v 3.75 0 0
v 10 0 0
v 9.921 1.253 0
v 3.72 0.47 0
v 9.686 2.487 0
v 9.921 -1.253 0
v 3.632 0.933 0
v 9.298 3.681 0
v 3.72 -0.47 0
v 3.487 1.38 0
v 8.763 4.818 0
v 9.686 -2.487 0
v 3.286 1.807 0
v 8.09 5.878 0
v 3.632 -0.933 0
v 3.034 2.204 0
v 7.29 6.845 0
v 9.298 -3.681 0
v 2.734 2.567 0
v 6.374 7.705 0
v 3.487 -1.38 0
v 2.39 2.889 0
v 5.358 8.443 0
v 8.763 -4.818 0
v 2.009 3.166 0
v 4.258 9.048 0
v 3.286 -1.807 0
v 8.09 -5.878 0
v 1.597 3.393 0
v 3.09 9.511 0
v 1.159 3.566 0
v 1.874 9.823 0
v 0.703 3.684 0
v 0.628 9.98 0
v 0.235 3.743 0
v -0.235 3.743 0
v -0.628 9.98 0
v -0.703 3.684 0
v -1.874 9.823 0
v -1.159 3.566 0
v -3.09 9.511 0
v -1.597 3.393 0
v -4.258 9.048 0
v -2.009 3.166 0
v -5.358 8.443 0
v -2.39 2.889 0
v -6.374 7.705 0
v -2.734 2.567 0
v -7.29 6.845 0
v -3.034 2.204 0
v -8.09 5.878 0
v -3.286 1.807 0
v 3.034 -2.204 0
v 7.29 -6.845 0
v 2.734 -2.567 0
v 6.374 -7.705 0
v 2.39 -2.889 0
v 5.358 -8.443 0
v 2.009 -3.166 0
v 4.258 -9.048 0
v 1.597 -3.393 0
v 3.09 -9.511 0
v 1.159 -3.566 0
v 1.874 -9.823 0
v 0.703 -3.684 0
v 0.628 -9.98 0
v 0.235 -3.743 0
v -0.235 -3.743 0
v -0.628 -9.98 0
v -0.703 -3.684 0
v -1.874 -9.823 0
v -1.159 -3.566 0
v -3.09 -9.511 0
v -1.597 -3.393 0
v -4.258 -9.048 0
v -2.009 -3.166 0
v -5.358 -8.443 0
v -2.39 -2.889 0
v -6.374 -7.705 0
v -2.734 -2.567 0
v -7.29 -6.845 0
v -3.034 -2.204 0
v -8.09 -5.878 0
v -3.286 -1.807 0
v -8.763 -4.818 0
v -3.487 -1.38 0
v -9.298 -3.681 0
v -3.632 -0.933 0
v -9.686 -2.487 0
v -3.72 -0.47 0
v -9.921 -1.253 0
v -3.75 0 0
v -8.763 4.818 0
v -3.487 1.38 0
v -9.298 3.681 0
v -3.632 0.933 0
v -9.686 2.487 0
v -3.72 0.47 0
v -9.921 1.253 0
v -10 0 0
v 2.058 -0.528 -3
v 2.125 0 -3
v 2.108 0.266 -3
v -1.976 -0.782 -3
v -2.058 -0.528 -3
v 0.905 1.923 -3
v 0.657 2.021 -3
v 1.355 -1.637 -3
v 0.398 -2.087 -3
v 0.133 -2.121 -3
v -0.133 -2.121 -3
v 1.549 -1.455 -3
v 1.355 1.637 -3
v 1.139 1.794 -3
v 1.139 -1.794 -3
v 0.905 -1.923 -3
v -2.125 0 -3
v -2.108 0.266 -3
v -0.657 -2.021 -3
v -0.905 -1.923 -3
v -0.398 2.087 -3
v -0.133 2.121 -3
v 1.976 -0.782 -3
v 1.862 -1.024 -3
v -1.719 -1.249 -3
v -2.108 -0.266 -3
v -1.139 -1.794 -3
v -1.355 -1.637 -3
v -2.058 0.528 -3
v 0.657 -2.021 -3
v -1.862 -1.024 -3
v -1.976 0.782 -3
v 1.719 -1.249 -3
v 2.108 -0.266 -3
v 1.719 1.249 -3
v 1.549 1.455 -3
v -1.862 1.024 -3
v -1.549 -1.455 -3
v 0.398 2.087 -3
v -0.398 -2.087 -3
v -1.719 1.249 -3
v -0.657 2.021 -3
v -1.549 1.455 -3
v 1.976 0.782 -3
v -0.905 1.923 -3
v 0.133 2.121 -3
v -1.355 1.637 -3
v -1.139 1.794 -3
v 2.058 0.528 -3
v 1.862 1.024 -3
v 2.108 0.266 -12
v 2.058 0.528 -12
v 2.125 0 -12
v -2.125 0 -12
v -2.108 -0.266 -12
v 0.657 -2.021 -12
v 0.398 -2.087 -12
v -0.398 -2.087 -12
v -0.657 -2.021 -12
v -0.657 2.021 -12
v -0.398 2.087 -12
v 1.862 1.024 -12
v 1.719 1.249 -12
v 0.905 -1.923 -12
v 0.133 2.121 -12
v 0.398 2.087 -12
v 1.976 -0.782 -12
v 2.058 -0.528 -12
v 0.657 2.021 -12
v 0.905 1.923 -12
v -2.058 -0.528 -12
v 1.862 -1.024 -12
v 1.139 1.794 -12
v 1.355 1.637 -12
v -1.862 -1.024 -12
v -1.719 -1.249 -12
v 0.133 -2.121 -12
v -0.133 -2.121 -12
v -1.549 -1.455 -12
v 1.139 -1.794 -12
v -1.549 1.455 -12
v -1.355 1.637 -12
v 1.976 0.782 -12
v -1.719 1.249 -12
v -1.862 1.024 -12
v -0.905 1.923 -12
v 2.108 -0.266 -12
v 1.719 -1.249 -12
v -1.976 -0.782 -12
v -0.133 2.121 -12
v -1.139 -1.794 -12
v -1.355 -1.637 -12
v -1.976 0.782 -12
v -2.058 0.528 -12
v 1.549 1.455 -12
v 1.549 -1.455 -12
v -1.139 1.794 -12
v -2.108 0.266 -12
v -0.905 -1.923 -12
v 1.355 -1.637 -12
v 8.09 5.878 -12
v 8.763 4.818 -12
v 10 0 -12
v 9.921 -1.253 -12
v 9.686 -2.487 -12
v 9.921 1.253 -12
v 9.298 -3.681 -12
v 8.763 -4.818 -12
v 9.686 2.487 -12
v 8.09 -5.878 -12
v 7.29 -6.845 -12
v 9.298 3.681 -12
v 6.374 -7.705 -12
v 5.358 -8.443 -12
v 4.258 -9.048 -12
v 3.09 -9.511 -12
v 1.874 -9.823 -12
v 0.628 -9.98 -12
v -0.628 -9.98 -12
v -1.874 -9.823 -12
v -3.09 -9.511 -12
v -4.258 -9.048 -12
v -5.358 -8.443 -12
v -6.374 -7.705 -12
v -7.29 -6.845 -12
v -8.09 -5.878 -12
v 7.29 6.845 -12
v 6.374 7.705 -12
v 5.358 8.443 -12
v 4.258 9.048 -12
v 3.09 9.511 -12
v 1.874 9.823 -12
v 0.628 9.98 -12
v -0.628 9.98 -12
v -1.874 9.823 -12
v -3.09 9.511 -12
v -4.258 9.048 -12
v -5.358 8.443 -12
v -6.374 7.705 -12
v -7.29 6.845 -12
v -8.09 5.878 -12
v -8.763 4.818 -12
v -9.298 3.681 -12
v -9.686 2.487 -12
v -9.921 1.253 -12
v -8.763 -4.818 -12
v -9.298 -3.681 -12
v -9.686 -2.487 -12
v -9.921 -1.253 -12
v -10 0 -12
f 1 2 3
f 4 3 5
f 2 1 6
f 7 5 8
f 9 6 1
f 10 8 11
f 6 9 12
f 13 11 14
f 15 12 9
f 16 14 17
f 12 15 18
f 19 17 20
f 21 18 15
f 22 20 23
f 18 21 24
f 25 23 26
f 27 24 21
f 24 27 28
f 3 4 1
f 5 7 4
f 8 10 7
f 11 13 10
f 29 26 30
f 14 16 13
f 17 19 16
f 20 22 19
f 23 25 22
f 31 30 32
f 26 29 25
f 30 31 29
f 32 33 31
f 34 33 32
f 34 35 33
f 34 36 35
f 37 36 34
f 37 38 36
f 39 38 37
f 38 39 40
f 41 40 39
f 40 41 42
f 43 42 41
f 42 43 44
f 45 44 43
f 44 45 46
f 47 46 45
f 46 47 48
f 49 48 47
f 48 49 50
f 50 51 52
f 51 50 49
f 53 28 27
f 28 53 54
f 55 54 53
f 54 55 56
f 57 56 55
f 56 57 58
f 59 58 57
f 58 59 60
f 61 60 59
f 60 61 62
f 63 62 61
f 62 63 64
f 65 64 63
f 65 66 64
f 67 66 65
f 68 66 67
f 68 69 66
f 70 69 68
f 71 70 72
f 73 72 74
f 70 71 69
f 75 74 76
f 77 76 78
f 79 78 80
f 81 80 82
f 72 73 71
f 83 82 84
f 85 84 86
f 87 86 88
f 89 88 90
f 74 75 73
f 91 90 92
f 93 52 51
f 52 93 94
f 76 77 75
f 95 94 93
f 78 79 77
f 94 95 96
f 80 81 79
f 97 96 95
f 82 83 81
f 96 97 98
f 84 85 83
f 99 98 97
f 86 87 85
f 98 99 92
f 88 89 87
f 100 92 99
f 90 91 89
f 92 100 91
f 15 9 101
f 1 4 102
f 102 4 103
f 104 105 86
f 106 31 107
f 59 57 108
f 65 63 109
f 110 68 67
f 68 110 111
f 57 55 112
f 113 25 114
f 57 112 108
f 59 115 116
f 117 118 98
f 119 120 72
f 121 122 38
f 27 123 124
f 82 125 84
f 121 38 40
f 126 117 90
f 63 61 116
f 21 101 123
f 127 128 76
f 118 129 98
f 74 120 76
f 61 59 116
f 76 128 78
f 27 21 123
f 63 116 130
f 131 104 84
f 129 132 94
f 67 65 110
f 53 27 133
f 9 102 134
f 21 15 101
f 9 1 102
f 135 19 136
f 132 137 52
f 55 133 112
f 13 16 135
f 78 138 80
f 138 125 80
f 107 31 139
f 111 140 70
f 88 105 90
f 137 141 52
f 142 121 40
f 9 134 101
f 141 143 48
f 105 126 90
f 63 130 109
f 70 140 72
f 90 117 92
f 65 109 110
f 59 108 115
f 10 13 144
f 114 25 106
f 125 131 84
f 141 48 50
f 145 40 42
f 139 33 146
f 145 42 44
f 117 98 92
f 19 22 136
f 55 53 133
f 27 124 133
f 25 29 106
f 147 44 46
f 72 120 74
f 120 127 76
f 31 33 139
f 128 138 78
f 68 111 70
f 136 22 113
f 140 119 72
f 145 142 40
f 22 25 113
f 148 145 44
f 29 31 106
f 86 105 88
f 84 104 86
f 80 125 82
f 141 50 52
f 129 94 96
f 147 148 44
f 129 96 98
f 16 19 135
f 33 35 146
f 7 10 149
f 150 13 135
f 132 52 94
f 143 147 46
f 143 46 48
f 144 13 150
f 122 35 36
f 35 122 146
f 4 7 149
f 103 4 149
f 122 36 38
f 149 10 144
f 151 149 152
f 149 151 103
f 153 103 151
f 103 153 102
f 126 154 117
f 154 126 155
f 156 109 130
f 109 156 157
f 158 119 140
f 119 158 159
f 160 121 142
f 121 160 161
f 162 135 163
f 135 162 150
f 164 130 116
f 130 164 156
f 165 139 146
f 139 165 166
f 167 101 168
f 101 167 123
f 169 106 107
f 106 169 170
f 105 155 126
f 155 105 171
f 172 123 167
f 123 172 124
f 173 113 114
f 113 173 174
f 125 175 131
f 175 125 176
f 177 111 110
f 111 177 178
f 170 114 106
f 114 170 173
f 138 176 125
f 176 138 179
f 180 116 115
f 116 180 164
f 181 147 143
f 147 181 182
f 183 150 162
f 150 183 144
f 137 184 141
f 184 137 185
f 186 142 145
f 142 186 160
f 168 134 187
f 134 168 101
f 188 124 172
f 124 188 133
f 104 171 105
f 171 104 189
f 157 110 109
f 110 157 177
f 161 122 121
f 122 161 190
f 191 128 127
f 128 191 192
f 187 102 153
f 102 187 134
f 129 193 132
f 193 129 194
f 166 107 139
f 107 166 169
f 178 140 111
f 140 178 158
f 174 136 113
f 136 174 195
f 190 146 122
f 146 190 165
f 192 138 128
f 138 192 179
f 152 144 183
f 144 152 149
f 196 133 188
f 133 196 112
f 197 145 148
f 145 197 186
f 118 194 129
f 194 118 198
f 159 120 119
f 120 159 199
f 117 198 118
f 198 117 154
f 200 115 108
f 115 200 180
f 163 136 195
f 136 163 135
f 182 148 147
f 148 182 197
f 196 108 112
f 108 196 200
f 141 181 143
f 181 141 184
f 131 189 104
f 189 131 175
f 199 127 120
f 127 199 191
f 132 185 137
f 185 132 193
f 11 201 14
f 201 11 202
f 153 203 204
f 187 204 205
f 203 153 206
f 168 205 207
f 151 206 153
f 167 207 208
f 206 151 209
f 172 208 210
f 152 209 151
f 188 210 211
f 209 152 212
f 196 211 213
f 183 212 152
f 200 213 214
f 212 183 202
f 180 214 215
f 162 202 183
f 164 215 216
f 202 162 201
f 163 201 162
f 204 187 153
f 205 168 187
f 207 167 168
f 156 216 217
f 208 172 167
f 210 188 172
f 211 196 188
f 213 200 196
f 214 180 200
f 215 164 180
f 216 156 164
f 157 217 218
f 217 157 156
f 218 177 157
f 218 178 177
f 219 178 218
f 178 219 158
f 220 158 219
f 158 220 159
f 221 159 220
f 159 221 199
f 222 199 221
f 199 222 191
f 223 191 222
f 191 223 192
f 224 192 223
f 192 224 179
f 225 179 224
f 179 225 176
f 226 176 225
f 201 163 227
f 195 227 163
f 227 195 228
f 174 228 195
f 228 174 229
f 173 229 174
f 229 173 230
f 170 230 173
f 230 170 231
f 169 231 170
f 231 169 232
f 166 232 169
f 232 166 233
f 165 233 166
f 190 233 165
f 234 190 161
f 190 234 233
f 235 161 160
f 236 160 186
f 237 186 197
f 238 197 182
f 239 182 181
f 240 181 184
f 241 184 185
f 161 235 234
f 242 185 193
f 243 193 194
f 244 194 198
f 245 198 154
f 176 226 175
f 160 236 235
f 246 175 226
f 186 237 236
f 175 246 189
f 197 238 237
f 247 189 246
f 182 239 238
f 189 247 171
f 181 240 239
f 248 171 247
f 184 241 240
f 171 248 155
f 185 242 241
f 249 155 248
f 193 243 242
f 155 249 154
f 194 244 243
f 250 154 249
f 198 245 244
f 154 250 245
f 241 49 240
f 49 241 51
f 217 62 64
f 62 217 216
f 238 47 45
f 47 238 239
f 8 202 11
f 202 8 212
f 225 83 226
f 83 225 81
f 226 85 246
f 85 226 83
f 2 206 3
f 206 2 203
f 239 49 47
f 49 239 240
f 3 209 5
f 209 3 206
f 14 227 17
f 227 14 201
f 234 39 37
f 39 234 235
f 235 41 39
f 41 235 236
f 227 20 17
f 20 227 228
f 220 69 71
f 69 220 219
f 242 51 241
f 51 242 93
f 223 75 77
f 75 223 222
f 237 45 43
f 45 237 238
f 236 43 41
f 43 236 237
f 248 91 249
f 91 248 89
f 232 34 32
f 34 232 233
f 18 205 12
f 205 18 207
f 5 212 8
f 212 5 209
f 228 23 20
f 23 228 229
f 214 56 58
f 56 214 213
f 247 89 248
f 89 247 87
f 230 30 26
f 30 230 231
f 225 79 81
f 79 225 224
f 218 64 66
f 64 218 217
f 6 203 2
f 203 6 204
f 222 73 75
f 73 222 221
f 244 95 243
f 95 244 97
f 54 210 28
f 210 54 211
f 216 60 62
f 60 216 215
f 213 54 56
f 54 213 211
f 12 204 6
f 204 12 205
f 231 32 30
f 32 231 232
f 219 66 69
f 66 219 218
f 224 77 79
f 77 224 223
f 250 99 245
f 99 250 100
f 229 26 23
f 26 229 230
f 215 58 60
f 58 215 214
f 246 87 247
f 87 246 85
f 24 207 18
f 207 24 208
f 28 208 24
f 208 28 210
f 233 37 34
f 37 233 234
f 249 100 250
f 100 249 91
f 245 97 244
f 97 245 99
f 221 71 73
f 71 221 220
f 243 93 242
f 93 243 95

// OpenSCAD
$fn = 50;

difference() {
	union() {
		translate(v = [0, 0, -12.0]) {
			cylinder(h = 12, r = 10.0);
		}
	}
	union() {
		translate(v = [0, 0, 0]) {
			rotate(a = [0, 0, 0]) {
				difference() {
					union() {
						translate(v = [0, 0, -15.0]) {
							cylinder(h = 15, r = 2.0);
						}
						translate(v = [0, 0, -3]) {
							cylinder(h = 3, r1 = 2.125, r2 = 3.75);
						}
						translate(v = [0, 0, -15.0]) {
							cylinder(h = 15, r = 2.125);
						}
						translate(v = [0, 0, -15.0]) {
							cylinder(h = 15, r = 2.0);
						}
					}
					union();
				}
			}
		}
	}
}
